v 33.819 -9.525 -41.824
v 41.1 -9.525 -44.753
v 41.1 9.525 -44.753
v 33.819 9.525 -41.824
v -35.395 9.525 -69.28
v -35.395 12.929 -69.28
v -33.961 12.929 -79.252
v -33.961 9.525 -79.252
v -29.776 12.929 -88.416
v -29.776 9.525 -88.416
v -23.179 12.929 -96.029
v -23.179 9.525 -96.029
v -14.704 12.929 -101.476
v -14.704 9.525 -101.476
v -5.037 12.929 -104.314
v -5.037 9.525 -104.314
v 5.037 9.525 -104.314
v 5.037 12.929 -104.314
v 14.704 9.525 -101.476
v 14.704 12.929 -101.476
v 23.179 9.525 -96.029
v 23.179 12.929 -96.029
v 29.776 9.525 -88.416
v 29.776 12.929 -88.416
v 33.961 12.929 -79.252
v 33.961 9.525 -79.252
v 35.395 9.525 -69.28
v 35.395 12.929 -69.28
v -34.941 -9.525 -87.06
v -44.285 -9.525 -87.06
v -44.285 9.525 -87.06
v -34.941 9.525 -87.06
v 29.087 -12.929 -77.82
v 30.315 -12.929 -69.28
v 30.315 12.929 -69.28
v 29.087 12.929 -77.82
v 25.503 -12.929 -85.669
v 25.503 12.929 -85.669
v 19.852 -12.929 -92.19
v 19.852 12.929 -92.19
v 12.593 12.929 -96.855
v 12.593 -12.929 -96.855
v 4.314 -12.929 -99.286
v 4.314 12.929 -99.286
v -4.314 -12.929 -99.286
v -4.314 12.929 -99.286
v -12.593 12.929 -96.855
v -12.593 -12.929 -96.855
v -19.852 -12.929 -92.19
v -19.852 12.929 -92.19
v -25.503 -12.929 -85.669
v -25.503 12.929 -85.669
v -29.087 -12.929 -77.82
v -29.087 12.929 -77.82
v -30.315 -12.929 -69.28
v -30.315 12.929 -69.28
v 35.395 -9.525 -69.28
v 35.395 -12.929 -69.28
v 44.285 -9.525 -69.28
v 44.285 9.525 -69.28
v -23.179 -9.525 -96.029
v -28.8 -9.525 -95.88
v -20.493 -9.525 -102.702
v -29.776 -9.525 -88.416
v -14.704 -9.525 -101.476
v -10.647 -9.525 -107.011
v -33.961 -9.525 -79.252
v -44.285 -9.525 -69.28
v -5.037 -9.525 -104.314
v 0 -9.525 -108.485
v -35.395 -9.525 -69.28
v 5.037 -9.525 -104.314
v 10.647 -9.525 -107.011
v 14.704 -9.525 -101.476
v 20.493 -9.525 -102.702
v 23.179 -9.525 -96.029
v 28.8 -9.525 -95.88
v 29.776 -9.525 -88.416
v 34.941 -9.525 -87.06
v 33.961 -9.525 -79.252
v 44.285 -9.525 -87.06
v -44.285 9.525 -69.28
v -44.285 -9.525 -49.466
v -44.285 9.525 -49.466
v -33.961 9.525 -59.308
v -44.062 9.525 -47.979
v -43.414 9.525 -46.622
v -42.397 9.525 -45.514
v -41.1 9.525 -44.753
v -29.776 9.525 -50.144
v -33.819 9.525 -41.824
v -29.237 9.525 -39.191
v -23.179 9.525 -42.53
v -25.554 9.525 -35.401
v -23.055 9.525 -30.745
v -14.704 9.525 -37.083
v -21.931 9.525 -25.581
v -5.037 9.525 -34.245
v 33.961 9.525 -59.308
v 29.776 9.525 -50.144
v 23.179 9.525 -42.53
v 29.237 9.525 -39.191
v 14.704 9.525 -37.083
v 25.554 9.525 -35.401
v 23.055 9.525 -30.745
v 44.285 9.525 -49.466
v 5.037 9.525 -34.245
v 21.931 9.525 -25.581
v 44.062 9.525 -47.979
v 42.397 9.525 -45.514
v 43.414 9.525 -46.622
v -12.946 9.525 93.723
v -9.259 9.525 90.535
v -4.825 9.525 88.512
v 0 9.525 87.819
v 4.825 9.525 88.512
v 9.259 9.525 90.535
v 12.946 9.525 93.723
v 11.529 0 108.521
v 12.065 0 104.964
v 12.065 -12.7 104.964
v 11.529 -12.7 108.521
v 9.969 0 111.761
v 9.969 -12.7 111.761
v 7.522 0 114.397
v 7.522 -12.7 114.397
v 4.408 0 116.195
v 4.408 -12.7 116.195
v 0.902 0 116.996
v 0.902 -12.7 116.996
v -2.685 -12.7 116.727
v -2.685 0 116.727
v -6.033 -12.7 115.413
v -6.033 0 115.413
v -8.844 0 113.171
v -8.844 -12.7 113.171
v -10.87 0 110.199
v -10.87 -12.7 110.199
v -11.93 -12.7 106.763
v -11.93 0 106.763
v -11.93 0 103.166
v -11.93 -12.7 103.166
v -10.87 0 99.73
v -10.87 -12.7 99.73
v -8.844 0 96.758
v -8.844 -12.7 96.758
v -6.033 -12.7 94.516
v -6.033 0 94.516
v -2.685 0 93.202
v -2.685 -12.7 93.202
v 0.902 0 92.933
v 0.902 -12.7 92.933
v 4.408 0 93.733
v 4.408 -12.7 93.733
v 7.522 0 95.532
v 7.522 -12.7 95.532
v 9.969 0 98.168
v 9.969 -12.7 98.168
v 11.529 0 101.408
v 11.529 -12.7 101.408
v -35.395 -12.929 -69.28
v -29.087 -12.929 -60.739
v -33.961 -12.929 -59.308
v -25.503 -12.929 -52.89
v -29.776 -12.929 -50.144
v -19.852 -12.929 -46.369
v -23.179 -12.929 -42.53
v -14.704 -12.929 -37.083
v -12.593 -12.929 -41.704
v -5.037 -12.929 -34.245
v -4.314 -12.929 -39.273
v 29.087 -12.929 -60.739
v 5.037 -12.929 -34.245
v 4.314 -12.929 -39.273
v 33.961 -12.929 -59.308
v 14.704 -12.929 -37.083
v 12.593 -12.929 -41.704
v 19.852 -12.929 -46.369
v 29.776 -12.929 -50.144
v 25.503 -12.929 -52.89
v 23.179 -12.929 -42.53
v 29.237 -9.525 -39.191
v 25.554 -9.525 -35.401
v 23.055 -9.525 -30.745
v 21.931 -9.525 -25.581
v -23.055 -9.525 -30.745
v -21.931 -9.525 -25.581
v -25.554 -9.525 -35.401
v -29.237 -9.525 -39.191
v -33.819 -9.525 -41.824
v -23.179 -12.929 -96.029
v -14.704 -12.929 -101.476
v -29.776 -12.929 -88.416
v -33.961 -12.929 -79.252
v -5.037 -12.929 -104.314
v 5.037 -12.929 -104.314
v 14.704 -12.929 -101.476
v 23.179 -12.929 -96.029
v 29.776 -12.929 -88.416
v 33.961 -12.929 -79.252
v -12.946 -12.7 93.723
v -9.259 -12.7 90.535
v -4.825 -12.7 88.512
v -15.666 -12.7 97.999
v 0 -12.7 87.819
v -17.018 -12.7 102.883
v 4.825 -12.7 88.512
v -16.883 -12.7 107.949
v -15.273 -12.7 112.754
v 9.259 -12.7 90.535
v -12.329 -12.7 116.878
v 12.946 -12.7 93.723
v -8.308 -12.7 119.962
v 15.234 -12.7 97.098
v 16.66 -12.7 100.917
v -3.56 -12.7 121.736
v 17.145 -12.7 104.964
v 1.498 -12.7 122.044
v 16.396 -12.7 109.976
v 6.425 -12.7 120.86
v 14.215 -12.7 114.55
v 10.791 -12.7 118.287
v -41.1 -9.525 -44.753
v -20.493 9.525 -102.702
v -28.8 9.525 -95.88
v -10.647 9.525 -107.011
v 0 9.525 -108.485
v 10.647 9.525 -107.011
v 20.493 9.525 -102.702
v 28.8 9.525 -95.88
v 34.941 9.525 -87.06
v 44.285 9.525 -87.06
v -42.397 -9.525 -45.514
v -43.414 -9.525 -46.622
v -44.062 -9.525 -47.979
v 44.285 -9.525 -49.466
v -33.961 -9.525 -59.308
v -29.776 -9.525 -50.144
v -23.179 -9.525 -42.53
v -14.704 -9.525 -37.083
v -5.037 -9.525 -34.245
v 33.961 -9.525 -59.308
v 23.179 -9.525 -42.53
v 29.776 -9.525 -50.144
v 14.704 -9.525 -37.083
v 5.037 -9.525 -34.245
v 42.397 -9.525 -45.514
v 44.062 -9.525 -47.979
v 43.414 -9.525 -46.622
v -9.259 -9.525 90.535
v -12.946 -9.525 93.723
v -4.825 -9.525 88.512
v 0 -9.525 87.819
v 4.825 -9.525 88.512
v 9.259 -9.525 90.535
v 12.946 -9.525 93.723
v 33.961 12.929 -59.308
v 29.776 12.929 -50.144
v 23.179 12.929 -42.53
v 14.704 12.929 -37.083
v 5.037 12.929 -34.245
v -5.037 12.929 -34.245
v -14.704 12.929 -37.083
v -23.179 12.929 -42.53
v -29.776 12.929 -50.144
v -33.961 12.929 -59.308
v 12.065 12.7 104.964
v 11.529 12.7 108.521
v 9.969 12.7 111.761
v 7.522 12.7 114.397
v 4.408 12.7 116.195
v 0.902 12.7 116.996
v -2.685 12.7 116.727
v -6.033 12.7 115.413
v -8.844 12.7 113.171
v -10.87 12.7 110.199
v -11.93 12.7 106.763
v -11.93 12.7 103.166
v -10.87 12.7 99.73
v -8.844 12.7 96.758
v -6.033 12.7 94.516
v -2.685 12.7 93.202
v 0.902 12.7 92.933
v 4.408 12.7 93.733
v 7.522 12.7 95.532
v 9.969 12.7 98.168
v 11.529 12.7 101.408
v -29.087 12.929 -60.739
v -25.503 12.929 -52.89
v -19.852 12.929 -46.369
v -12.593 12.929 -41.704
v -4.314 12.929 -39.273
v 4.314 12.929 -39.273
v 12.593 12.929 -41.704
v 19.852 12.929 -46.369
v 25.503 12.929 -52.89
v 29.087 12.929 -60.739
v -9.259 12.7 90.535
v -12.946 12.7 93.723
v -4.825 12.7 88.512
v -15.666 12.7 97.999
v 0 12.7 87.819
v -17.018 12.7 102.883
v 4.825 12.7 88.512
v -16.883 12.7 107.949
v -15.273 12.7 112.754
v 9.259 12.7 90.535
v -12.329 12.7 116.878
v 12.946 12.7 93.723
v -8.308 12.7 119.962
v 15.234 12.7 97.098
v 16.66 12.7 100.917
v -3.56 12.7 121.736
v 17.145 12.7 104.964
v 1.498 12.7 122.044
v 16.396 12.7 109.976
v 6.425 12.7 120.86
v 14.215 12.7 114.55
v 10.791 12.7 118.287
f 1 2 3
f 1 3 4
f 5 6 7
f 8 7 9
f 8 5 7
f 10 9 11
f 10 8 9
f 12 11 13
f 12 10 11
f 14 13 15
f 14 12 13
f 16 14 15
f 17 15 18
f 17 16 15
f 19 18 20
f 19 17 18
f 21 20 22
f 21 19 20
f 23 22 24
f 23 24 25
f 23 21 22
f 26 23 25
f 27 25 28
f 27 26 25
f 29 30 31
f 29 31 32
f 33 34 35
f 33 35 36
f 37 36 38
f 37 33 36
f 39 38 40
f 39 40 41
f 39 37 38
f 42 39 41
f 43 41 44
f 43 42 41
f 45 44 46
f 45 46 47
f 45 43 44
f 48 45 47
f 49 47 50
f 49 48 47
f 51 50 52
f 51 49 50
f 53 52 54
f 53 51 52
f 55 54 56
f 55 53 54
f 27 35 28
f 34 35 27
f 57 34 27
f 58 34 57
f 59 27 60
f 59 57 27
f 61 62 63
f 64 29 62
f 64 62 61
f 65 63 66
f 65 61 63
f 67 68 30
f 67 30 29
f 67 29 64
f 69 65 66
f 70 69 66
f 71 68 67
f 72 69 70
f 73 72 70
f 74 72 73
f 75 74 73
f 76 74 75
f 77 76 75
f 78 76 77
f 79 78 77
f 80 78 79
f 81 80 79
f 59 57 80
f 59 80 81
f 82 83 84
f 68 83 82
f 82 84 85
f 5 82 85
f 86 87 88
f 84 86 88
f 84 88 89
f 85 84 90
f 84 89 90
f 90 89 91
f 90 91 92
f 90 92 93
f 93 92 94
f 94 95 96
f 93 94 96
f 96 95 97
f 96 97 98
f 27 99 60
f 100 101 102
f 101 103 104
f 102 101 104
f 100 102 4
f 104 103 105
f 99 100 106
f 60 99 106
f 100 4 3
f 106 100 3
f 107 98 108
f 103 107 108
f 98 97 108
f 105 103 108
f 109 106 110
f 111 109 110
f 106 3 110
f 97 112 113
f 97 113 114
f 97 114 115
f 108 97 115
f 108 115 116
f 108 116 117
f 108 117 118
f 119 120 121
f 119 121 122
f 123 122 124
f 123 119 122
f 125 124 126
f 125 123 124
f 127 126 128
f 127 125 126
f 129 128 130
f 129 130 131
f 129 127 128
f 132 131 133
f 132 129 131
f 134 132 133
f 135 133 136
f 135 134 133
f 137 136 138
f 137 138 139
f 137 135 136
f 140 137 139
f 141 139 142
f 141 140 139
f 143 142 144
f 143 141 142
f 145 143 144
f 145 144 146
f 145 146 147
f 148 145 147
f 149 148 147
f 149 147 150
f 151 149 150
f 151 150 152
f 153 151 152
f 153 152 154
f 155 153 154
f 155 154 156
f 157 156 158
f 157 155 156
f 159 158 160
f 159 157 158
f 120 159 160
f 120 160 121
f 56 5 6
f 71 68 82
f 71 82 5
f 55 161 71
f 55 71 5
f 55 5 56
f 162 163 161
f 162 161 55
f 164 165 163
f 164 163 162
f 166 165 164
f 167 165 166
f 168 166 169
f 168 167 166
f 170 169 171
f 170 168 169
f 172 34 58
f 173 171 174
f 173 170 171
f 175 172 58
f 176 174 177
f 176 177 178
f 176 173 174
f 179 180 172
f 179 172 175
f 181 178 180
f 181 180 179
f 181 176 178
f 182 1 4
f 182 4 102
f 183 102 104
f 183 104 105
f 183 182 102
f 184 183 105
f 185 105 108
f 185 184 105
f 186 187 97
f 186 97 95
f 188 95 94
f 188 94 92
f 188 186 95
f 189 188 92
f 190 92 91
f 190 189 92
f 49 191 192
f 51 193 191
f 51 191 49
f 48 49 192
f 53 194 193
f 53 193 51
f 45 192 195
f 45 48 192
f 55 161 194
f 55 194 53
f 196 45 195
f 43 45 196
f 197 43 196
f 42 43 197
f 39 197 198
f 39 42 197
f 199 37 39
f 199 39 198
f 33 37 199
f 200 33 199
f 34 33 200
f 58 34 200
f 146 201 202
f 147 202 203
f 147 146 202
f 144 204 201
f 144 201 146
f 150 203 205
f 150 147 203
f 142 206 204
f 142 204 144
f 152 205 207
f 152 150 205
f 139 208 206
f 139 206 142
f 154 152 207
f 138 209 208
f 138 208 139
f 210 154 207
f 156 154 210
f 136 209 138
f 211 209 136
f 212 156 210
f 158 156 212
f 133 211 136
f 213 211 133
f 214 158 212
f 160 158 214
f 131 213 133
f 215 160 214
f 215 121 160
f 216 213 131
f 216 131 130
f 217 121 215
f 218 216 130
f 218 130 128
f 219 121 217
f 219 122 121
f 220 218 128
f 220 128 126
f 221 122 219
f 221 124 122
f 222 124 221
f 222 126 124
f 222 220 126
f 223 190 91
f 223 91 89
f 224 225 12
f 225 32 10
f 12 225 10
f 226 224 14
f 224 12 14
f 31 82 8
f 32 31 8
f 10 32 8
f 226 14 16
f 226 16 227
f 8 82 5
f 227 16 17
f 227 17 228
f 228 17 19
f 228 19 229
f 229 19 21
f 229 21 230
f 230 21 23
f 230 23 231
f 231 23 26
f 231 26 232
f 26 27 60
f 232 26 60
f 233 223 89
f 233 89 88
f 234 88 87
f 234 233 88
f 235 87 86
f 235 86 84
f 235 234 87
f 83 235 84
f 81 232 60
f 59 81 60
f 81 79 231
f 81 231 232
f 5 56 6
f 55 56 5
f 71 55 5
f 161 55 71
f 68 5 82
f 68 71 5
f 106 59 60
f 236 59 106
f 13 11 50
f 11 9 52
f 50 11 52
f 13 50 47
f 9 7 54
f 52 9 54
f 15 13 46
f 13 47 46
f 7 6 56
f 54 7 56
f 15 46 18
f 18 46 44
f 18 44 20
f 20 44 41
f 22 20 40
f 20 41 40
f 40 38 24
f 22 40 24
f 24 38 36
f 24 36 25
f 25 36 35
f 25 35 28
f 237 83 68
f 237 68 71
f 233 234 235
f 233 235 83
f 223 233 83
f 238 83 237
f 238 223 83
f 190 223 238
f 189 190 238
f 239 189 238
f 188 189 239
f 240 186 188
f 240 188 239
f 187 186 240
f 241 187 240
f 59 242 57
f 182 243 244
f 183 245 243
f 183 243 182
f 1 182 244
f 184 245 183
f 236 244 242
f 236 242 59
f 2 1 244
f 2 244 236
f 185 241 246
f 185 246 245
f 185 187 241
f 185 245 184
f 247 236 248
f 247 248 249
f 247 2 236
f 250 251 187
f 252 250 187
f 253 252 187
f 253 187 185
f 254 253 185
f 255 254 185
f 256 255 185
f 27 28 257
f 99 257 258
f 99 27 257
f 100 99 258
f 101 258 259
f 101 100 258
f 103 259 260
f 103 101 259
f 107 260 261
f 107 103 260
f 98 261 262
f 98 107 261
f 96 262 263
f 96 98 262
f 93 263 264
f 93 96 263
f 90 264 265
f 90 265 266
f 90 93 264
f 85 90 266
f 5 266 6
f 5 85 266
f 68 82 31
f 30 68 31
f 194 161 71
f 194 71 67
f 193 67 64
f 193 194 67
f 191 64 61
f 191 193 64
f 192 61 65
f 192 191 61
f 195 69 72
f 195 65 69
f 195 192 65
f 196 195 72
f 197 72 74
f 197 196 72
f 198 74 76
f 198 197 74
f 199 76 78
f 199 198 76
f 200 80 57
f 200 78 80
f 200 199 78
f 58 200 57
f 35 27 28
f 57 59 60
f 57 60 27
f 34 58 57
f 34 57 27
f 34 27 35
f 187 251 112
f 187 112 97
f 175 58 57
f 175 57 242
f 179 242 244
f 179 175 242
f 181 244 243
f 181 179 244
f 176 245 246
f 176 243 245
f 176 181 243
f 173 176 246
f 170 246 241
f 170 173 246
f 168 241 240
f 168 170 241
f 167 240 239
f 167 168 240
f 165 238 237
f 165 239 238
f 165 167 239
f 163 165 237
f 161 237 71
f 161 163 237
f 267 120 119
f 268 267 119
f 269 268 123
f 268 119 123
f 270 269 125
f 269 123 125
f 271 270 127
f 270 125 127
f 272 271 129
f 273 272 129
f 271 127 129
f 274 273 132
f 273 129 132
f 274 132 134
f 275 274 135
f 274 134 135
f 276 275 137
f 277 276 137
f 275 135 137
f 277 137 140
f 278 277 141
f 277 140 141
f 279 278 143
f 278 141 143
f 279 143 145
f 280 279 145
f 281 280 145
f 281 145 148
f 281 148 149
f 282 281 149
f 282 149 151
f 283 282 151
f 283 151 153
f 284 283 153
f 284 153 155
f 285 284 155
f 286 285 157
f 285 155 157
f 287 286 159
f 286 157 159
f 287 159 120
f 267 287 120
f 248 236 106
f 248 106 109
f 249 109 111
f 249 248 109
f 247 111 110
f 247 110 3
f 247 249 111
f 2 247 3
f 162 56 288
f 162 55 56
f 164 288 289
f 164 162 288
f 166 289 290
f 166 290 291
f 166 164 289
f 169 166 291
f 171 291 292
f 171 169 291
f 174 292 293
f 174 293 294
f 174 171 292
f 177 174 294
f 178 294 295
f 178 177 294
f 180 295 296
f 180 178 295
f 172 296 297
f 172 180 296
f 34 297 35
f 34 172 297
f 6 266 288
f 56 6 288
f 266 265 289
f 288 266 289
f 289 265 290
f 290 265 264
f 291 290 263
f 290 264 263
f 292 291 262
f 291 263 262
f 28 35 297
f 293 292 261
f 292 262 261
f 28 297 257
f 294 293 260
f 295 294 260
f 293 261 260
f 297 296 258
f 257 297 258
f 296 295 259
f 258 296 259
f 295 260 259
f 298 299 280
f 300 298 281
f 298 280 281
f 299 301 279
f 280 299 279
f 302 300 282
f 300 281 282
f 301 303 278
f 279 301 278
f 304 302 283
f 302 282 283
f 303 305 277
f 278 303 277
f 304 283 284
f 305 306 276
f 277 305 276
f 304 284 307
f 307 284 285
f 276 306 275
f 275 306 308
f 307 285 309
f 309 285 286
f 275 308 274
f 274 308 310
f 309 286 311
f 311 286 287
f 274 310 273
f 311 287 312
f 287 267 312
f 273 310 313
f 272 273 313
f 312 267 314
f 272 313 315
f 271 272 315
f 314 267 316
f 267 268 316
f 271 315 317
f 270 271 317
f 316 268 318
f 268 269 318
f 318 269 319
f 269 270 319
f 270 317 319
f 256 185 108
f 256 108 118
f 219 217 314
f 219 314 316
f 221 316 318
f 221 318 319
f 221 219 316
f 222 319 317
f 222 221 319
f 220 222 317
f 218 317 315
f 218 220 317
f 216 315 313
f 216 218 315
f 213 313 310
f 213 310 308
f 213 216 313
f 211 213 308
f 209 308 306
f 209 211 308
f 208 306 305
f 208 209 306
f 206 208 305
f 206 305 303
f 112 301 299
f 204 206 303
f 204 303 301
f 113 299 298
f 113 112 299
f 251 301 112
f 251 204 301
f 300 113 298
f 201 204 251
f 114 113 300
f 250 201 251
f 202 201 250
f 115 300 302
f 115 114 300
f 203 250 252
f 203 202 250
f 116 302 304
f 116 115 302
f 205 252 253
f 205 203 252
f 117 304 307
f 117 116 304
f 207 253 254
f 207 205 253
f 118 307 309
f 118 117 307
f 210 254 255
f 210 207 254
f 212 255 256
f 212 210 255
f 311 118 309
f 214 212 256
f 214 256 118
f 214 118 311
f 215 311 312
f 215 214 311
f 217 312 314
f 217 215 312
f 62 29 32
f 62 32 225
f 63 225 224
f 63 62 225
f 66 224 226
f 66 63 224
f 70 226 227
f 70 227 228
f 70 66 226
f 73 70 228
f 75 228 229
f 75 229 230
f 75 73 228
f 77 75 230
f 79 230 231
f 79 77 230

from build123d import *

# Parameters (mm, degrees)
F1_DEPTH = 12.9286
F2_DEPTH = 9.525
F3_DEPTH = 12.9286
F4_DEPTH = 9.525
F0_R     = 12.065
F5_DEPTH = 12.7


with BuildPart() as f1:
    # F0 (on Front) → F1 (new body, symmetric)
    with BuildSketch(Plane.XZ):
        with BuildLine():
            ThreePointArc((-30.3149, -69.2796702024), (0, -38.9647702024), (30.3149, -69.2796702024))
            Line((30.3149, -69.2796702024), (35.3949, -69.2796702024))
            ThreePointArc((35.3949, -69.2796702024), (0, -33.8847702024), (-35.3949, -69.2796702024))
            Line((-35.3949, -69.2796702024), (-30.3149, -69.2796702024))
        make_face()
    extrude(amount=F1_DEPTH, both=True)

    # F0 (on Front) → F2 (join, symmetric)
    with BuildSketch(Plane.XZ):
        with BuildLine():
            ThreePointArc((-39.2049, -69.2796702024), (0, -30.0747702024), (39.2049, -69.2796702024))
            Line((39.2049, -69.2796702024), (44.2849, -69.2796702024))
            Line((44.2849, -69.2796702024), (44.2849, -49.4660918501))
            ThreePointArc((44.2849, -49.4660918501), (43.4141556404, -46.6220512467), (41.1004248213, -44.7529839952))
            Line((41.1004248213, -44.7529839952), (33.8186777373, -41.8243999769))
            ThreePointArc((33.8186777373, -41.8243999769), (25.5540866411, -35.4009894091), (21.9306908548, -25.5808737129))
            Line((21.9306908548, -25.5808737129), (12.9457367136, 93.7233811748))
            ThreePointArc((12.9457367136, 93.7233811748), (0, 87.8193297976), (-12.9457367136, 93.7233811748))
            Line((-12.9457367136, 93.7233811748), (-21.9306908548, -25.5808737129))
            ThreePointArc((-21.9306908548, -25.5808737129), (-25.5540866411, -35.4009894091), (-33.8186777373, -41.8243999769))
            Line((-33.8186777373, -41.8243999769), (-41.1004248213, -44.7529839952))
            ThreePointArc((-41.1004248213, -44.7529839952), (-43.4141556404, -46.6220512467), (-44.2849, -49.4660918501))
            Line((-44.2849, -49.4660918501), (-44.2849, -69.2796702024))
            Line((-44.2849, -69.2796702024), (-39.2049, -69.2796702024))
        make_face()
        with BuildLine():
            ThreePointArc((-35.3949, -69.2796702024), (0, -33.8847702024), (35.3949, -69.2796702024))
            Line((35.3949, -69.2796702024), (39.2049, -69.2796702024))
            ThreePointArc((39.2049, -69.2796702024), (0, -30.0747702024), (-39.2049, -69.2796702024))
            Line((-39.2049, -69.2796702024), (-35.3949, -69.2796702024))
        make_face()
    extrude(amount=F2_DEPTH, both=True)

    # F0 (on Front) → F5 (join, symmetric)
    with BuildSketch(Plane.XZ):
        with BuildLine():
            ThreePointArc((-12.9457367136, 93.7233811748), (0, 87.8193297976), (12.9457367136, 93.7233811748))
            ThreePointArc((12.9457367136, 93.7233811748), (16.0609103253, 98.9644810893), (17.145, 104.9643297976))
            ThreePointArc((17.145, 104.9643297976), (-5.9998487083, 121.0252401229), (-12.9457367136, 93.7233811748))
        make_face()
        with Locations((0, 104.9643297976)):
            Circle(F0_R, mode=Mode.SUBTRACT)
    extrude(amount=F5_DEPTH, both=True)


with BuildPart() as f3:
    # F0 (on Front) → F3 (new body, symmetric)
    with BuildSketch(Plane.XZ):
        with BuildLine():
            Line((35.3949, -69.2796702024), (30.3149, -69.2796702024))
            ThreePointArc((30.3149, -69.2796702024), (0, -99.5945702024), (-30.3149, -69.2796702024))
            Line((-30.3149, -69.2796702024), (-35.3949, -69.2796702024))
            ThreePointArc((-35.3949, -69.2796702024), (0, -104.6745702024), (35.3949, -69.2796702024))
        make_face()
    extrude(amount=F3_DEPTH, both=True)

    # F0 (on Front) → F4 (join, symmetric)
    with BuildSketch(Plane.XZ):
        with BuildLine():
            ThreePointArc((-34.941319151, -87.0596702024), (-38.1241072498, -78.4216957117), (-39.2049, -69.2796702024))
            Line((-39.2049, -69.2796702024), (-44.2849, -69.2796702024))
            Line((-44.2849, -69.2796702024), (-44.2849, -87.0596702024))
            Line((-44.2849, -87.0596702024), (-34.941319151, -87.0596702024))
        make_face()
        with BuildLine():
            Line((39.2049, -69.2796702024), (35.3949, -69.2796702024))
            ThreePointArc((35.3949, -69.2796702024), (0, -104.6745702024), (-35.3949, -69.2796702024))
            Line((-35.3949, -69.2796702024), (-39.2049, -69.2796702024))
            ThreePointArc((-39.2049, -69.2796702024), (-38.1241072498, -78.4216957117), (-34.941319151, -87.0596702024))
            ThreePointArc((-34.941319151, -87.0596702024), (0, -108.4845702024), (34.941319151, -87.0596702024))
            ThreePointArc((34.941319151, -87.0596702024), (38.1241072498, -78.4216957117), (39.2049, -69.2796702024))
        make_face()
        with BuildLine():
            Line((44.2849, -69.2796702024), (39.2049, -69.2796702024))
            ThreePointArc((39.2049, -69.2796702024), (38.1241072498, -78.4216957117), (34.941319151, -87.0596702024))
            Line((34.941319151, -87.0596702024), (44.2849, -87.0596702024))
            Line((44.2849, -87.0596702024), (44.2849, -69.2796702024))
        make_face()
    extrude(amount=F4_DEPTH, both=True)


solid = Compound([f1.part, f3.part])
